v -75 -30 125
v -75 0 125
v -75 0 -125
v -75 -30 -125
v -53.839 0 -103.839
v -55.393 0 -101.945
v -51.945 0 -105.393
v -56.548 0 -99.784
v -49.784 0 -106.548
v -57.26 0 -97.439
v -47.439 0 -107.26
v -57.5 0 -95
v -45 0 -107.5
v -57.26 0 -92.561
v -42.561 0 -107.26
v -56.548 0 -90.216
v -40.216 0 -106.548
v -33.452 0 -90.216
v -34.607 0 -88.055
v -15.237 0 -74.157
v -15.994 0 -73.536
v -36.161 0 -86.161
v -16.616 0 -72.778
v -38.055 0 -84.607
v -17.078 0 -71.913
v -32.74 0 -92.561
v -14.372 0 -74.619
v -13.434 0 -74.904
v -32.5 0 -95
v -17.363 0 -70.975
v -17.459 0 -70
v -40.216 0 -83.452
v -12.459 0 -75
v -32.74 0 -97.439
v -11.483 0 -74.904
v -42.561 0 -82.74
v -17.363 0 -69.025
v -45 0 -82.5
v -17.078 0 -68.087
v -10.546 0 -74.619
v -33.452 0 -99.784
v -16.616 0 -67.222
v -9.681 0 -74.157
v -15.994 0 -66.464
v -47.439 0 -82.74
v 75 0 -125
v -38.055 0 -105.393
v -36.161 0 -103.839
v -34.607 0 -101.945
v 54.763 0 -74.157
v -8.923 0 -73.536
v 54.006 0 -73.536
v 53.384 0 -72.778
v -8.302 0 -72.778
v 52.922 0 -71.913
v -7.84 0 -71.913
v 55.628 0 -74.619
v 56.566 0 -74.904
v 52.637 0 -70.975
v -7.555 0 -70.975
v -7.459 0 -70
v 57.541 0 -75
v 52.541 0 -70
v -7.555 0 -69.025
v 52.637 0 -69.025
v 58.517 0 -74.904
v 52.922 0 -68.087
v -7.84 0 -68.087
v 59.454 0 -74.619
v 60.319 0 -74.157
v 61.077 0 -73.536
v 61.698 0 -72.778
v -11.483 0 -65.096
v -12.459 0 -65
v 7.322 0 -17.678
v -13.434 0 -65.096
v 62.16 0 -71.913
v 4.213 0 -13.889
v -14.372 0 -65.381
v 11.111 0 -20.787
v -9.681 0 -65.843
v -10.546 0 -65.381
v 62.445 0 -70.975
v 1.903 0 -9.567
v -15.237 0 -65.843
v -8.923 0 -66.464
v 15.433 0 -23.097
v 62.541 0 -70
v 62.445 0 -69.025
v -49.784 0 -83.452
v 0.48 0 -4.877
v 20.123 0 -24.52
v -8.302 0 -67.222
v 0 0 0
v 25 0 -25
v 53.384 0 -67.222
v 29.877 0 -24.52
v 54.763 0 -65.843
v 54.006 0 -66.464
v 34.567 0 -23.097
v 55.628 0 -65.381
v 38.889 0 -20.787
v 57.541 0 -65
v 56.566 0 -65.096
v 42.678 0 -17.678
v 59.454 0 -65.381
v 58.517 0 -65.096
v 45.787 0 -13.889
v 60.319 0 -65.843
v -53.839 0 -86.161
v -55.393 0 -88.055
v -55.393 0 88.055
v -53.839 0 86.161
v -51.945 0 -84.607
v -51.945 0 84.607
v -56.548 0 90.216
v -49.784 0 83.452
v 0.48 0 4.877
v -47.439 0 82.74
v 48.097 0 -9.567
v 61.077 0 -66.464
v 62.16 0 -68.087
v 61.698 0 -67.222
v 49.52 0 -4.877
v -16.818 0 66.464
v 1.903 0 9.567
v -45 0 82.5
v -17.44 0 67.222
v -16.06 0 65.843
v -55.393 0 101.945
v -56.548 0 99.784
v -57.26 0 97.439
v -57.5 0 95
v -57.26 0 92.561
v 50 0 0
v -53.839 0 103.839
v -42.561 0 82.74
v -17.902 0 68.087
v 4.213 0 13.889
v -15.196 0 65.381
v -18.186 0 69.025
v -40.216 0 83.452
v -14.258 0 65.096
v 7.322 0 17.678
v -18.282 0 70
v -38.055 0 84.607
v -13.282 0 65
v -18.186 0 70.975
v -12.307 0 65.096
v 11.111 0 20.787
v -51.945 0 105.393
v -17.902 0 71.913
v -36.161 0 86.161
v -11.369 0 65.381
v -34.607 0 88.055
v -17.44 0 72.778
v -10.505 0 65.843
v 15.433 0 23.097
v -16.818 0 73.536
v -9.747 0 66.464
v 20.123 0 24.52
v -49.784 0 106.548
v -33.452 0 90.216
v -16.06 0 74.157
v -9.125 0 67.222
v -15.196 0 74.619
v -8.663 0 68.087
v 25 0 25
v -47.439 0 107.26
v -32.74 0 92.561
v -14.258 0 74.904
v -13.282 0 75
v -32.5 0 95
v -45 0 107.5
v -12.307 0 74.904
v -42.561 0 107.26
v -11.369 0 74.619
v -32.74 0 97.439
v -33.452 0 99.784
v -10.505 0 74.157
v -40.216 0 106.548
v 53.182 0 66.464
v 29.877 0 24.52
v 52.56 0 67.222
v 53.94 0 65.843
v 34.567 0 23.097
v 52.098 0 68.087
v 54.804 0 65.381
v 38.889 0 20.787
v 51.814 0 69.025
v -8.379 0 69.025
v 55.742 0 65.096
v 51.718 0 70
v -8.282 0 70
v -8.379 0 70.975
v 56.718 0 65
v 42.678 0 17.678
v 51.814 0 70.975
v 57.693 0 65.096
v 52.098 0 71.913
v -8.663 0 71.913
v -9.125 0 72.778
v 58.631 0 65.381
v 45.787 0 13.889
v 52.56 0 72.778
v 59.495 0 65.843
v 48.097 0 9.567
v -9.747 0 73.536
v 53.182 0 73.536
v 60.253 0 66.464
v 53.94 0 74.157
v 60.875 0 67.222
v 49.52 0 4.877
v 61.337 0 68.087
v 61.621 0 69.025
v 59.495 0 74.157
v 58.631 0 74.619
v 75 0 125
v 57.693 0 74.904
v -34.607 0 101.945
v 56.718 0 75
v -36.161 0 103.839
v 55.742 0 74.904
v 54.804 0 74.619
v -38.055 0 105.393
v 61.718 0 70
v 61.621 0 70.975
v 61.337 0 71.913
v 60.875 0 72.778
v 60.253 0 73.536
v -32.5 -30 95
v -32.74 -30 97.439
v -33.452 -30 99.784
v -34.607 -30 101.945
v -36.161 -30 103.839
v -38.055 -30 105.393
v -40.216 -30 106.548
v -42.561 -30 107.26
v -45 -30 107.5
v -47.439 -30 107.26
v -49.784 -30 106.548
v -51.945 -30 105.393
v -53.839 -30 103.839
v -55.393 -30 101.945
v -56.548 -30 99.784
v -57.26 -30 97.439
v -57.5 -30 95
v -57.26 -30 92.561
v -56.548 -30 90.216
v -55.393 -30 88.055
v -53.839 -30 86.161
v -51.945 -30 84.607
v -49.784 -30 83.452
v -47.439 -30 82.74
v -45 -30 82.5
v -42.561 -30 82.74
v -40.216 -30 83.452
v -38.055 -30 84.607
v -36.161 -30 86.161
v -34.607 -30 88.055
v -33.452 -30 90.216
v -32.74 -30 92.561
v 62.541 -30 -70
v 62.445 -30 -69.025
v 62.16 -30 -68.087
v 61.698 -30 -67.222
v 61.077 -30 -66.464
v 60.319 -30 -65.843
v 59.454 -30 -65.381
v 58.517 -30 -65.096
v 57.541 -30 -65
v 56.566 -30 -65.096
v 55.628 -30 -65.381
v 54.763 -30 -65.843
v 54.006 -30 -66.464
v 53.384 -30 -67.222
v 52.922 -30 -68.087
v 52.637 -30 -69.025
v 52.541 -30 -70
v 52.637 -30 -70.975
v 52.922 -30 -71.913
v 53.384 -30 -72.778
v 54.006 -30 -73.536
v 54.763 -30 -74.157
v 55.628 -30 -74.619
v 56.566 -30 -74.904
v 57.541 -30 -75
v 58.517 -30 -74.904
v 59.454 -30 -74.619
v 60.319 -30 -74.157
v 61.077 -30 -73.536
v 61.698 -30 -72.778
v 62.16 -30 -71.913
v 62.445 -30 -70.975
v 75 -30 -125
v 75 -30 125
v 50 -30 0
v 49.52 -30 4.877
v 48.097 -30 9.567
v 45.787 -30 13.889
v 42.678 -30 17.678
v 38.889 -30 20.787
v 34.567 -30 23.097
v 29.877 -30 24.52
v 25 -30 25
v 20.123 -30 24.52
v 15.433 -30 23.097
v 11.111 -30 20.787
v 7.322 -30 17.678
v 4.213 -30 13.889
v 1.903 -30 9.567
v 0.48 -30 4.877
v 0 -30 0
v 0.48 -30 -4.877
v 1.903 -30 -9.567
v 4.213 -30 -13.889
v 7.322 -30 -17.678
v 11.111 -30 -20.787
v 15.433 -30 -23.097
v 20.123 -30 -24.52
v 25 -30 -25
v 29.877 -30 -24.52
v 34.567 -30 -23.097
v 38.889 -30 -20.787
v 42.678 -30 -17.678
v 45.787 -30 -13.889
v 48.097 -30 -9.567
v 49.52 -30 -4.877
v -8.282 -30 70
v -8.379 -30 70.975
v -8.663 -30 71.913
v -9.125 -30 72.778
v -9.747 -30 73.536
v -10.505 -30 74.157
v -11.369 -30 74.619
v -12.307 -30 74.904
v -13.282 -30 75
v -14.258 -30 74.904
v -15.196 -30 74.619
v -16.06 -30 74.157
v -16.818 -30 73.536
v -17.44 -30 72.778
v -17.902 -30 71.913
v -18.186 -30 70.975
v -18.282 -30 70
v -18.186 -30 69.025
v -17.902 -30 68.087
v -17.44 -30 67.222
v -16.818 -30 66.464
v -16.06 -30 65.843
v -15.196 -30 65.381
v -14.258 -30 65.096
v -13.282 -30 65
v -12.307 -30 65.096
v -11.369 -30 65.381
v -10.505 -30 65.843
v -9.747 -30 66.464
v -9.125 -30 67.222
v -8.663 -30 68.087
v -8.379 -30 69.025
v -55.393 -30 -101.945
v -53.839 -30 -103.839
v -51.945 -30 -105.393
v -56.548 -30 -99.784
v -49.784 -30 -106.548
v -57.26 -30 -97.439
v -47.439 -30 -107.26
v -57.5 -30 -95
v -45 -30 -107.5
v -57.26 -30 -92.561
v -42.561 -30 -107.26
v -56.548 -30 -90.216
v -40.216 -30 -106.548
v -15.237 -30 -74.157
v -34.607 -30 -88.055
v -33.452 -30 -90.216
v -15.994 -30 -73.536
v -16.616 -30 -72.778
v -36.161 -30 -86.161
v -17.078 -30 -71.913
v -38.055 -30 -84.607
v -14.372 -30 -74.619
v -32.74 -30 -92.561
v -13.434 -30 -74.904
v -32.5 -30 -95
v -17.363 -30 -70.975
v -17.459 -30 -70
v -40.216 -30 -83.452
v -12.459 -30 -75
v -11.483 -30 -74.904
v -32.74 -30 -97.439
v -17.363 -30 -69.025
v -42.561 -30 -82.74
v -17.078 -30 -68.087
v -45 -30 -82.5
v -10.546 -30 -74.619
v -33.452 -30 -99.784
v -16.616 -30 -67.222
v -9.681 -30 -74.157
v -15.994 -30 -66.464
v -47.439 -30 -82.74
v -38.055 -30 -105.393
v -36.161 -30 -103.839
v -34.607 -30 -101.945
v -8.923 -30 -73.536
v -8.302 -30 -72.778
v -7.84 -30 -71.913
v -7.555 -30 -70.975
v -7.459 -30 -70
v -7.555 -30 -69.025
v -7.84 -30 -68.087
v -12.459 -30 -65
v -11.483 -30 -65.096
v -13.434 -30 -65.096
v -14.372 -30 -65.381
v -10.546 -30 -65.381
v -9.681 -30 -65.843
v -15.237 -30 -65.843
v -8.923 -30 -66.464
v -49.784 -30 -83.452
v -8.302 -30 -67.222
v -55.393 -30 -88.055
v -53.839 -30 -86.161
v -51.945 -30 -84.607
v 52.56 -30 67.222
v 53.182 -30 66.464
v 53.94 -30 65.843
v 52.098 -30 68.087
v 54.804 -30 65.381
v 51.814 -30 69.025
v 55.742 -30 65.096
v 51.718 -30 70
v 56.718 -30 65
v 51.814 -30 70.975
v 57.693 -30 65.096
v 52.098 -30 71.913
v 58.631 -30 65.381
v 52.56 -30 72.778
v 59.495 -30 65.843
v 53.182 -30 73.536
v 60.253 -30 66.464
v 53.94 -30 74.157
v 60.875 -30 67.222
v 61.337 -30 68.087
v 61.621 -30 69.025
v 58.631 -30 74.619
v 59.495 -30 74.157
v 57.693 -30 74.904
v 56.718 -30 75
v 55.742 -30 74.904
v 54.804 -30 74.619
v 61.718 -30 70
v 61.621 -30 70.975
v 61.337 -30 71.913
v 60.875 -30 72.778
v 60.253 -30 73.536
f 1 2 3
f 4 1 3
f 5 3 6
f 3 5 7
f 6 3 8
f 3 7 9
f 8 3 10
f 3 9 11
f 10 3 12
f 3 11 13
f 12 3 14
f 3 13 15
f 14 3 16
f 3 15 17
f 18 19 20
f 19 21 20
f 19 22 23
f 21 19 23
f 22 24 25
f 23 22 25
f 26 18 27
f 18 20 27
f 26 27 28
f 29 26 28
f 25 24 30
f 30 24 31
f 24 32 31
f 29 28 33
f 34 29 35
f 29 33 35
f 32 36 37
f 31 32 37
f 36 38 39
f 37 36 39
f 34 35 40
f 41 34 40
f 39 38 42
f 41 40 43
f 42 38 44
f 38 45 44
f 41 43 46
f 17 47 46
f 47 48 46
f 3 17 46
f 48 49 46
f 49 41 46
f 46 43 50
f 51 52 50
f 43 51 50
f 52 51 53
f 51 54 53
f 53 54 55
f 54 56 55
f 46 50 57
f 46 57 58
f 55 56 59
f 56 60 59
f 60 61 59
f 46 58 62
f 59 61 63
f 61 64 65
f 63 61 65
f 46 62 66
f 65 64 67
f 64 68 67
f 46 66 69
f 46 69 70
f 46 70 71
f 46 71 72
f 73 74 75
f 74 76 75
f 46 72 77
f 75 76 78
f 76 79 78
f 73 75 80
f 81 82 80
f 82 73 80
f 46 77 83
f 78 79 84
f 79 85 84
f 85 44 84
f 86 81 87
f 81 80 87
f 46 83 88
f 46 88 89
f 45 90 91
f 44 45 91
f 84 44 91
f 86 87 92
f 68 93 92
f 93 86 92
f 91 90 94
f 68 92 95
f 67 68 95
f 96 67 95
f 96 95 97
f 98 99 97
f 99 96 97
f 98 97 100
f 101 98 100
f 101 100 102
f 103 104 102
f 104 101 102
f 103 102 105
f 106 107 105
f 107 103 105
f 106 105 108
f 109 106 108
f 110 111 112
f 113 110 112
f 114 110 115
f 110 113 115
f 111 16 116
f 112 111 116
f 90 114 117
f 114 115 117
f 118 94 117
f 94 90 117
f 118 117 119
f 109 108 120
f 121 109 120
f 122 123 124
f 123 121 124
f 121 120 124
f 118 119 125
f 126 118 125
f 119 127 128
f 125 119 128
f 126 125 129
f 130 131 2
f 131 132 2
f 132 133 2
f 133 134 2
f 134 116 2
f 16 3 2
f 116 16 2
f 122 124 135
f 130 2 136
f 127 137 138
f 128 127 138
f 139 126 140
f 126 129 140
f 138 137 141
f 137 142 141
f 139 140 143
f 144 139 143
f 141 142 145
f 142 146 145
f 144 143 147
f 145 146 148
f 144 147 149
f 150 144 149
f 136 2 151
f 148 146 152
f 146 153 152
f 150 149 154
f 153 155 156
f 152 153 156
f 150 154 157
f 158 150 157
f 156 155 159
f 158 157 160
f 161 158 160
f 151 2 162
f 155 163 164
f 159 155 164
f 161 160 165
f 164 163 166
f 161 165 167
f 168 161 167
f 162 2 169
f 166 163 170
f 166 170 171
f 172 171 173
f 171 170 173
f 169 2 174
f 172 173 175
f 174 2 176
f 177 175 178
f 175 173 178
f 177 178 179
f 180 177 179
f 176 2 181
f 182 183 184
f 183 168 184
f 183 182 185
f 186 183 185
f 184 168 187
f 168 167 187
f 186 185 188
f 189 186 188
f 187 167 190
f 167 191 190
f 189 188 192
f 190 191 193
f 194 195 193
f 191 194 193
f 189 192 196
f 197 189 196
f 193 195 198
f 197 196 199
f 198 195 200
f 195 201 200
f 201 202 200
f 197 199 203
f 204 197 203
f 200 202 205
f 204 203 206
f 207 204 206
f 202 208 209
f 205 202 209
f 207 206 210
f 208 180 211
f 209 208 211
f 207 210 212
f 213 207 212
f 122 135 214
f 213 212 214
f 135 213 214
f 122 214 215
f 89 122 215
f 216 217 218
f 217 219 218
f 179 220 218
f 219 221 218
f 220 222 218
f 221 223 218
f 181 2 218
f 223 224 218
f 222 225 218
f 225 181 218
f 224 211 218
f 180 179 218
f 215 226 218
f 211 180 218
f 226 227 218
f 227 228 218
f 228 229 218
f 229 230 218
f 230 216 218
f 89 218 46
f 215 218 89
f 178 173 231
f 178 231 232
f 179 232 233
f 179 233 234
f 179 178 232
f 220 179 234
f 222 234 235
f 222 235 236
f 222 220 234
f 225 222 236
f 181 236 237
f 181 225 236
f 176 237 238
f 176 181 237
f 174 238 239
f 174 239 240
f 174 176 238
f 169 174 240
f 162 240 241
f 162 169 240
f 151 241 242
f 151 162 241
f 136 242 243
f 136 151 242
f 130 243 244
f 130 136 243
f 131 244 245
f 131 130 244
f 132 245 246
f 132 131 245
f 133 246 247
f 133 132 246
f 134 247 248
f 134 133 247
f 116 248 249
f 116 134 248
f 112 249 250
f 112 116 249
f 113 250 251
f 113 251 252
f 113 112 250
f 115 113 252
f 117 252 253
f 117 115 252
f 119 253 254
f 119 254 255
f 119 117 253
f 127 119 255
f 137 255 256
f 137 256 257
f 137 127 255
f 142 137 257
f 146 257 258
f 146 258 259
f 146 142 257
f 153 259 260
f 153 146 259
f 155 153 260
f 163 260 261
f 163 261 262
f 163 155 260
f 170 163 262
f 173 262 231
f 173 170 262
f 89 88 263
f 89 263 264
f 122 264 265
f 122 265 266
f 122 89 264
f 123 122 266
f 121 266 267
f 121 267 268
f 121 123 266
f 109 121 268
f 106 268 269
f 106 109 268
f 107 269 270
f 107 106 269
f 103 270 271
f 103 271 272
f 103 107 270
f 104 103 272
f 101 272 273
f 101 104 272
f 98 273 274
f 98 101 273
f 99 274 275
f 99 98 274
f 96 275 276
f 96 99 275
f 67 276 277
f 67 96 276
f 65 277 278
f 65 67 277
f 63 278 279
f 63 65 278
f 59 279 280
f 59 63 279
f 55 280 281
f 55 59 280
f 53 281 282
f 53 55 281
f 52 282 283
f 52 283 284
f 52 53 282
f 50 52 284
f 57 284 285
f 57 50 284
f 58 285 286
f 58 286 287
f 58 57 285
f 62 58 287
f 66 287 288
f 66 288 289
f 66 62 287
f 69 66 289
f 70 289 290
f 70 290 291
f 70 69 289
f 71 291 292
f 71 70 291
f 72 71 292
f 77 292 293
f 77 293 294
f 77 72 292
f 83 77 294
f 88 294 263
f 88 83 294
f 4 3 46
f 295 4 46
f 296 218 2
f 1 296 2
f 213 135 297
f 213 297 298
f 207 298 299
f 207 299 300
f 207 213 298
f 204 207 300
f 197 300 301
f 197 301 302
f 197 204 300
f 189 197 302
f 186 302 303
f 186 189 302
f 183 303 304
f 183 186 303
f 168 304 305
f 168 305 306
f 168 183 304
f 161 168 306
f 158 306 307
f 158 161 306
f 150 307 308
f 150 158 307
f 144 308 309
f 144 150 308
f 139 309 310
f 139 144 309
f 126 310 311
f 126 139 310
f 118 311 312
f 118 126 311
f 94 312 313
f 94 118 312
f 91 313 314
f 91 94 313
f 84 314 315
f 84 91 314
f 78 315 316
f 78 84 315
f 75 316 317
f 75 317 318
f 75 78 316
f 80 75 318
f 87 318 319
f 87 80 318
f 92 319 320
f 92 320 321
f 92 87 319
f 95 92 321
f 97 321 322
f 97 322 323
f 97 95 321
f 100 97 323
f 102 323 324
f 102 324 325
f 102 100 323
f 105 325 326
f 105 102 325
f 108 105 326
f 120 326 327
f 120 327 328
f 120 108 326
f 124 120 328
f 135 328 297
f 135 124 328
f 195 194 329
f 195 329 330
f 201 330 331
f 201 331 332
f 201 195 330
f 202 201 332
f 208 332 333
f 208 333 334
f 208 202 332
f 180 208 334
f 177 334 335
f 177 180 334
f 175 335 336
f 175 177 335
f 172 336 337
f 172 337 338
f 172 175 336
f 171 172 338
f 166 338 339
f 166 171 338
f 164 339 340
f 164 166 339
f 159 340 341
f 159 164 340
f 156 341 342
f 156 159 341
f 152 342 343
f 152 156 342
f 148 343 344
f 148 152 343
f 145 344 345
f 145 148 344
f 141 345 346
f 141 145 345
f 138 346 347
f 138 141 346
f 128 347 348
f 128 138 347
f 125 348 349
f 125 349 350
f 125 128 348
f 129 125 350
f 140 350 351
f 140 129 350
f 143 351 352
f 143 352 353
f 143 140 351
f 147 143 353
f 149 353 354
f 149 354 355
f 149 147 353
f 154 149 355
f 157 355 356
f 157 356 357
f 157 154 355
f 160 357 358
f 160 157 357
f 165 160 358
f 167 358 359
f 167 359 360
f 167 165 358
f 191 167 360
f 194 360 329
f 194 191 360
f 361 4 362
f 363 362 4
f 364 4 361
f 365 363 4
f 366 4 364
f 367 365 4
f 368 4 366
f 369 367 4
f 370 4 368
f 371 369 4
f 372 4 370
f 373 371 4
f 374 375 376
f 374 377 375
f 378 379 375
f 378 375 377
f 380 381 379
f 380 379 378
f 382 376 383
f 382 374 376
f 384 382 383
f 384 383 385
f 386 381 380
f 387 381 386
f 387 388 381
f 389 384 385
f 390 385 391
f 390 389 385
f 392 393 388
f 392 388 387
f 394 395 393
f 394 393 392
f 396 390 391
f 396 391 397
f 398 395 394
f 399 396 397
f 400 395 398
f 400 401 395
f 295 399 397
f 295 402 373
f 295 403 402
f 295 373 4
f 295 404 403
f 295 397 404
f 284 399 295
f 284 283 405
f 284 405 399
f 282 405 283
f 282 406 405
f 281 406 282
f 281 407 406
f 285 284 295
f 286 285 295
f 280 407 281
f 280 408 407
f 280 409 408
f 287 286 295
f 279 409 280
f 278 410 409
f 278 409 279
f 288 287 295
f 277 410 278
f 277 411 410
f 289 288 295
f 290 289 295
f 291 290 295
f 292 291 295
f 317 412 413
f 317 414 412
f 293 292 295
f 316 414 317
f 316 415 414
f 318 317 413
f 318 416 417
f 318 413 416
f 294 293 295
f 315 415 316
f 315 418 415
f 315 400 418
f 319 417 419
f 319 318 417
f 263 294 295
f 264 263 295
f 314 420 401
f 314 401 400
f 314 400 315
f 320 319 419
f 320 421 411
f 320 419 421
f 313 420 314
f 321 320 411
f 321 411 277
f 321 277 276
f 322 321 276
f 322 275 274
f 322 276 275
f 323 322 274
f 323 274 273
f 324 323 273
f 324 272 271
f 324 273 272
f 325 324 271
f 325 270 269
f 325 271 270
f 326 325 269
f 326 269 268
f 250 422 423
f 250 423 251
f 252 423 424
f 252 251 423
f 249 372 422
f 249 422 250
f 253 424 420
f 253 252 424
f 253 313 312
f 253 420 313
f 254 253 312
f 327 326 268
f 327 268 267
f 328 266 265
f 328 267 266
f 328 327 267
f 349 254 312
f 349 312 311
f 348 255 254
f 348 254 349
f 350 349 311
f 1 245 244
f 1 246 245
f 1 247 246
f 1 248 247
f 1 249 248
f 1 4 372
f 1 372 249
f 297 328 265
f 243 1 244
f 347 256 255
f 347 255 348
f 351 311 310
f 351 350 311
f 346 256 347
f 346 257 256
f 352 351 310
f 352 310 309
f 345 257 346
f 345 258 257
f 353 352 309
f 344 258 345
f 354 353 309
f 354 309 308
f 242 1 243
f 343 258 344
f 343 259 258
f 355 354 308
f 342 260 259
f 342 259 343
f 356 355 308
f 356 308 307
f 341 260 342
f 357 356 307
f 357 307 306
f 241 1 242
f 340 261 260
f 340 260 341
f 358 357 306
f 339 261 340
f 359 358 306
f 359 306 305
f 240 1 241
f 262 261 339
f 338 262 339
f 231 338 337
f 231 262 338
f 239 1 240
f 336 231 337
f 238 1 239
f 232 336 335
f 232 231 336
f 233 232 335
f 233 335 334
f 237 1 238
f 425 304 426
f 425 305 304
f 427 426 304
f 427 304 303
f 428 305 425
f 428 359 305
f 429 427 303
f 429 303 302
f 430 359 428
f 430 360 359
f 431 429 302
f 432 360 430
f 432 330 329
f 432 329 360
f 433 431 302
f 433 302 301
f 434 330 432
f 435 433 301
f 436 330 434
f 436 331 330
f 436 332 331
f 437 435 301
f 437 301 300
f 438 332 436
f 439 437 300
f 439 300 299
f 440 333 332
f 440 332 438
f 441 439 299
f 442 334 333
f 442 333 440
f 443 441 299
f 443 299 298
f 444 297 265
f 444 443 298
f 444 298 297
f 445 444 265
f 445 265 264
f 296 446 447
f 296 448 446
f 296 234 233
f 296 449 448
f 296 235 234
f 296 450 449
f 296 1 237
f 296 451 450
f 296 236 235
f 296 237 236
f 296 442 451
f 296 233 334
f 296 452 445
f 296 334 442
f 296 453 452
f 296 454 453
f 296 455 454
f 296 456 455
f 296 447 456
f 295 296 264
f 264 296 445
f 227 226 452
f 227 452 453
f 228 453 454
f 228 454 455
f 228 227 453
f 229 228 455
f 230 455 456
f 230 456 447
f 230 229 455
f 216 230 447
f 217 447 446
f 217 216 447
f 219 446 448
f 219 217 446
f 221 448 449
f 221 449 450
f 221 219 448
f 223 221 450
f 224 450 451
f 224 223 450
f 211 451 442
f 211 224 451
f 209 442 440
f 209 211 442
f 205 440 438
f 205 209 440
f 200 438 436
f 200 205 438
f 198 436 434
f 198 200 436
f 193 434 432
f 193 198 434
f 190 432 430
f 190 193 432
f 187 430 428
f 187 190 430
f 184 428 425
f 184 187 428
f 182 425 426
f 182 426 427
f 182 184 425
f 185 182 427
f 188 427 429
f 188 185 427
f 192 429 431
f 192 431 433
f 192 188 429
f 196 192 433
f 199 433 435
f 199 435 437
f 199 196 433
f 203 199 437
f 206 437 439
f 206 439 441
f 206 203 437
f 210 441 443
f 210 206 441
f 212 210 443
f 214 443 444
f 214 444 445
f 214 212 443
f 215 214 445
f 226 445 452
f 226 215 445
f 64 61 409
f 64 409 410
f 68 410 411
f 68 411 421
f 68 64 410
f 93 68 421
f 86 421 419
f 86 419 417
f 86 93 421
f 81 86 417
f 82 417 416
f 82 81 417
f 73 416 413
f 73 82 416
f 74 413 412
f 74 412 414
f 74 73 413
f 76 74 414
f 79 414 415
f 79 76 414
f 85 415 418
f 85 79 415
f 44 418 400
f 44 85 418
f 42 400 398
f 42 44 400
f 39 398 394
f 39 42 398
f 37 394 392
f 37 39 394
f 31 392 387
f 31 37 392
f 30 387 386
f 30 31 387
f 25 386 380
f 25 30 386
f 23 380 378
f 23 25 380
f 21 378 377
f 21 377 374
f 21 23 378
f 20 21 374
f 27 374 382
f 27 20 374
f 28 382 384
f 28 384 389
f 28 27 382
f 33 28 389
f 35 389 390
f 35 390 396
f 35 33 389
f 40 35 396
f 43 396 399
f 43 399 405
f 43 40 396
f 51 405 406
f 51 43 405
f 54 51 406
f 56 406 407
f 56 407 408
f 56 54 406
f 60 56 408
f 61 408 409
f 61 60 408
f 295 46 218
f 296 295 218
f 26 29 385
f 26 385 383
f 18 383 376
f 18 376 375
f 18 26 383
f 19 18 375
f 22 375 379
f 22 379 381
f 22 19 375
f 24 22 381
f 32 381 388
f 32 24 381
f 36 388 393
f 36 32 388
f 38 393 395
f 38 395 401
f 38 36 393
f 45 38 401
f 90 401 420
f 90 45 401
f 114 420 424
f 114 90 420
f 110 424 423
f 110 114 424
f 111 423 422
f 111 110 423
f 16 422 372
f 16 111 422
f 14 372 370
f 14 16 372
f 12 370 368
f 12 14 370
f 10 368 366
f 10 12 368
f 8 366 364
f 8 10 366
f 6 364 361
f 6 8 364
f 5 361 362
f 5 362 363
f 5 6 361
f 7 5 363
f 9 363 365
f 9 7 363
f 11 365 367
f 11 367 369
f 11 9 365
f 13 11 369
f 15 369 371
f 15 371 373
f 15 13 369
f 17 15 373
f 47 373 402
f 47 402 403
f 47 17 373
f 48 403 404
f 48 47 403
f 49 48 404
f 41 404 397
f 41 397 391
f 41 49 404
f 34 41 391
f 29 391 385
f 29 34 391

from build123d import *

# Parameters (mm, degrees)
F0_R     = 12.5
F0_R_2   = 5
F0_R_3   = 25
F1_DEPTH = 30


with BuildPart() as f1:
    # F0 (on Front) → F1 (new body)
    with BuildSketch(Plane.XZ):
        Polygon((75, -70), (75, 125), (-75, 125), (-75, -125), (75, -125), align=None)
        with Locations((-45, -95)):
            Circle(F0_R, mode=Mode.SUBTRACT)
        with Locations((-12.458926, -70)):
            Circle(F0_R_2, mode=Mode.SUBTRACT)
        with Locations((57.541074, -70)):
            Circle(F0_R_2, mode=Mode.SUBTRACT)
        with Locations((-45, 95)):
            Circle(F0_R, mode=Mode.SUBTRACT)
        with Locations((-13.282487, 70)):
            Circle(F0_R_2, mode=Mode.SUBTRACT)
        with Locations((25, 0)):
            Circle(F0_R_3, mode=Mode.SUBTRACT)
        with Locations((56.717513, 70)):
            Circle(F0_R_2, mode=Mode.SUBTRACT)
    extrude(amount=F1_DEPTH)


solid = f1.part
